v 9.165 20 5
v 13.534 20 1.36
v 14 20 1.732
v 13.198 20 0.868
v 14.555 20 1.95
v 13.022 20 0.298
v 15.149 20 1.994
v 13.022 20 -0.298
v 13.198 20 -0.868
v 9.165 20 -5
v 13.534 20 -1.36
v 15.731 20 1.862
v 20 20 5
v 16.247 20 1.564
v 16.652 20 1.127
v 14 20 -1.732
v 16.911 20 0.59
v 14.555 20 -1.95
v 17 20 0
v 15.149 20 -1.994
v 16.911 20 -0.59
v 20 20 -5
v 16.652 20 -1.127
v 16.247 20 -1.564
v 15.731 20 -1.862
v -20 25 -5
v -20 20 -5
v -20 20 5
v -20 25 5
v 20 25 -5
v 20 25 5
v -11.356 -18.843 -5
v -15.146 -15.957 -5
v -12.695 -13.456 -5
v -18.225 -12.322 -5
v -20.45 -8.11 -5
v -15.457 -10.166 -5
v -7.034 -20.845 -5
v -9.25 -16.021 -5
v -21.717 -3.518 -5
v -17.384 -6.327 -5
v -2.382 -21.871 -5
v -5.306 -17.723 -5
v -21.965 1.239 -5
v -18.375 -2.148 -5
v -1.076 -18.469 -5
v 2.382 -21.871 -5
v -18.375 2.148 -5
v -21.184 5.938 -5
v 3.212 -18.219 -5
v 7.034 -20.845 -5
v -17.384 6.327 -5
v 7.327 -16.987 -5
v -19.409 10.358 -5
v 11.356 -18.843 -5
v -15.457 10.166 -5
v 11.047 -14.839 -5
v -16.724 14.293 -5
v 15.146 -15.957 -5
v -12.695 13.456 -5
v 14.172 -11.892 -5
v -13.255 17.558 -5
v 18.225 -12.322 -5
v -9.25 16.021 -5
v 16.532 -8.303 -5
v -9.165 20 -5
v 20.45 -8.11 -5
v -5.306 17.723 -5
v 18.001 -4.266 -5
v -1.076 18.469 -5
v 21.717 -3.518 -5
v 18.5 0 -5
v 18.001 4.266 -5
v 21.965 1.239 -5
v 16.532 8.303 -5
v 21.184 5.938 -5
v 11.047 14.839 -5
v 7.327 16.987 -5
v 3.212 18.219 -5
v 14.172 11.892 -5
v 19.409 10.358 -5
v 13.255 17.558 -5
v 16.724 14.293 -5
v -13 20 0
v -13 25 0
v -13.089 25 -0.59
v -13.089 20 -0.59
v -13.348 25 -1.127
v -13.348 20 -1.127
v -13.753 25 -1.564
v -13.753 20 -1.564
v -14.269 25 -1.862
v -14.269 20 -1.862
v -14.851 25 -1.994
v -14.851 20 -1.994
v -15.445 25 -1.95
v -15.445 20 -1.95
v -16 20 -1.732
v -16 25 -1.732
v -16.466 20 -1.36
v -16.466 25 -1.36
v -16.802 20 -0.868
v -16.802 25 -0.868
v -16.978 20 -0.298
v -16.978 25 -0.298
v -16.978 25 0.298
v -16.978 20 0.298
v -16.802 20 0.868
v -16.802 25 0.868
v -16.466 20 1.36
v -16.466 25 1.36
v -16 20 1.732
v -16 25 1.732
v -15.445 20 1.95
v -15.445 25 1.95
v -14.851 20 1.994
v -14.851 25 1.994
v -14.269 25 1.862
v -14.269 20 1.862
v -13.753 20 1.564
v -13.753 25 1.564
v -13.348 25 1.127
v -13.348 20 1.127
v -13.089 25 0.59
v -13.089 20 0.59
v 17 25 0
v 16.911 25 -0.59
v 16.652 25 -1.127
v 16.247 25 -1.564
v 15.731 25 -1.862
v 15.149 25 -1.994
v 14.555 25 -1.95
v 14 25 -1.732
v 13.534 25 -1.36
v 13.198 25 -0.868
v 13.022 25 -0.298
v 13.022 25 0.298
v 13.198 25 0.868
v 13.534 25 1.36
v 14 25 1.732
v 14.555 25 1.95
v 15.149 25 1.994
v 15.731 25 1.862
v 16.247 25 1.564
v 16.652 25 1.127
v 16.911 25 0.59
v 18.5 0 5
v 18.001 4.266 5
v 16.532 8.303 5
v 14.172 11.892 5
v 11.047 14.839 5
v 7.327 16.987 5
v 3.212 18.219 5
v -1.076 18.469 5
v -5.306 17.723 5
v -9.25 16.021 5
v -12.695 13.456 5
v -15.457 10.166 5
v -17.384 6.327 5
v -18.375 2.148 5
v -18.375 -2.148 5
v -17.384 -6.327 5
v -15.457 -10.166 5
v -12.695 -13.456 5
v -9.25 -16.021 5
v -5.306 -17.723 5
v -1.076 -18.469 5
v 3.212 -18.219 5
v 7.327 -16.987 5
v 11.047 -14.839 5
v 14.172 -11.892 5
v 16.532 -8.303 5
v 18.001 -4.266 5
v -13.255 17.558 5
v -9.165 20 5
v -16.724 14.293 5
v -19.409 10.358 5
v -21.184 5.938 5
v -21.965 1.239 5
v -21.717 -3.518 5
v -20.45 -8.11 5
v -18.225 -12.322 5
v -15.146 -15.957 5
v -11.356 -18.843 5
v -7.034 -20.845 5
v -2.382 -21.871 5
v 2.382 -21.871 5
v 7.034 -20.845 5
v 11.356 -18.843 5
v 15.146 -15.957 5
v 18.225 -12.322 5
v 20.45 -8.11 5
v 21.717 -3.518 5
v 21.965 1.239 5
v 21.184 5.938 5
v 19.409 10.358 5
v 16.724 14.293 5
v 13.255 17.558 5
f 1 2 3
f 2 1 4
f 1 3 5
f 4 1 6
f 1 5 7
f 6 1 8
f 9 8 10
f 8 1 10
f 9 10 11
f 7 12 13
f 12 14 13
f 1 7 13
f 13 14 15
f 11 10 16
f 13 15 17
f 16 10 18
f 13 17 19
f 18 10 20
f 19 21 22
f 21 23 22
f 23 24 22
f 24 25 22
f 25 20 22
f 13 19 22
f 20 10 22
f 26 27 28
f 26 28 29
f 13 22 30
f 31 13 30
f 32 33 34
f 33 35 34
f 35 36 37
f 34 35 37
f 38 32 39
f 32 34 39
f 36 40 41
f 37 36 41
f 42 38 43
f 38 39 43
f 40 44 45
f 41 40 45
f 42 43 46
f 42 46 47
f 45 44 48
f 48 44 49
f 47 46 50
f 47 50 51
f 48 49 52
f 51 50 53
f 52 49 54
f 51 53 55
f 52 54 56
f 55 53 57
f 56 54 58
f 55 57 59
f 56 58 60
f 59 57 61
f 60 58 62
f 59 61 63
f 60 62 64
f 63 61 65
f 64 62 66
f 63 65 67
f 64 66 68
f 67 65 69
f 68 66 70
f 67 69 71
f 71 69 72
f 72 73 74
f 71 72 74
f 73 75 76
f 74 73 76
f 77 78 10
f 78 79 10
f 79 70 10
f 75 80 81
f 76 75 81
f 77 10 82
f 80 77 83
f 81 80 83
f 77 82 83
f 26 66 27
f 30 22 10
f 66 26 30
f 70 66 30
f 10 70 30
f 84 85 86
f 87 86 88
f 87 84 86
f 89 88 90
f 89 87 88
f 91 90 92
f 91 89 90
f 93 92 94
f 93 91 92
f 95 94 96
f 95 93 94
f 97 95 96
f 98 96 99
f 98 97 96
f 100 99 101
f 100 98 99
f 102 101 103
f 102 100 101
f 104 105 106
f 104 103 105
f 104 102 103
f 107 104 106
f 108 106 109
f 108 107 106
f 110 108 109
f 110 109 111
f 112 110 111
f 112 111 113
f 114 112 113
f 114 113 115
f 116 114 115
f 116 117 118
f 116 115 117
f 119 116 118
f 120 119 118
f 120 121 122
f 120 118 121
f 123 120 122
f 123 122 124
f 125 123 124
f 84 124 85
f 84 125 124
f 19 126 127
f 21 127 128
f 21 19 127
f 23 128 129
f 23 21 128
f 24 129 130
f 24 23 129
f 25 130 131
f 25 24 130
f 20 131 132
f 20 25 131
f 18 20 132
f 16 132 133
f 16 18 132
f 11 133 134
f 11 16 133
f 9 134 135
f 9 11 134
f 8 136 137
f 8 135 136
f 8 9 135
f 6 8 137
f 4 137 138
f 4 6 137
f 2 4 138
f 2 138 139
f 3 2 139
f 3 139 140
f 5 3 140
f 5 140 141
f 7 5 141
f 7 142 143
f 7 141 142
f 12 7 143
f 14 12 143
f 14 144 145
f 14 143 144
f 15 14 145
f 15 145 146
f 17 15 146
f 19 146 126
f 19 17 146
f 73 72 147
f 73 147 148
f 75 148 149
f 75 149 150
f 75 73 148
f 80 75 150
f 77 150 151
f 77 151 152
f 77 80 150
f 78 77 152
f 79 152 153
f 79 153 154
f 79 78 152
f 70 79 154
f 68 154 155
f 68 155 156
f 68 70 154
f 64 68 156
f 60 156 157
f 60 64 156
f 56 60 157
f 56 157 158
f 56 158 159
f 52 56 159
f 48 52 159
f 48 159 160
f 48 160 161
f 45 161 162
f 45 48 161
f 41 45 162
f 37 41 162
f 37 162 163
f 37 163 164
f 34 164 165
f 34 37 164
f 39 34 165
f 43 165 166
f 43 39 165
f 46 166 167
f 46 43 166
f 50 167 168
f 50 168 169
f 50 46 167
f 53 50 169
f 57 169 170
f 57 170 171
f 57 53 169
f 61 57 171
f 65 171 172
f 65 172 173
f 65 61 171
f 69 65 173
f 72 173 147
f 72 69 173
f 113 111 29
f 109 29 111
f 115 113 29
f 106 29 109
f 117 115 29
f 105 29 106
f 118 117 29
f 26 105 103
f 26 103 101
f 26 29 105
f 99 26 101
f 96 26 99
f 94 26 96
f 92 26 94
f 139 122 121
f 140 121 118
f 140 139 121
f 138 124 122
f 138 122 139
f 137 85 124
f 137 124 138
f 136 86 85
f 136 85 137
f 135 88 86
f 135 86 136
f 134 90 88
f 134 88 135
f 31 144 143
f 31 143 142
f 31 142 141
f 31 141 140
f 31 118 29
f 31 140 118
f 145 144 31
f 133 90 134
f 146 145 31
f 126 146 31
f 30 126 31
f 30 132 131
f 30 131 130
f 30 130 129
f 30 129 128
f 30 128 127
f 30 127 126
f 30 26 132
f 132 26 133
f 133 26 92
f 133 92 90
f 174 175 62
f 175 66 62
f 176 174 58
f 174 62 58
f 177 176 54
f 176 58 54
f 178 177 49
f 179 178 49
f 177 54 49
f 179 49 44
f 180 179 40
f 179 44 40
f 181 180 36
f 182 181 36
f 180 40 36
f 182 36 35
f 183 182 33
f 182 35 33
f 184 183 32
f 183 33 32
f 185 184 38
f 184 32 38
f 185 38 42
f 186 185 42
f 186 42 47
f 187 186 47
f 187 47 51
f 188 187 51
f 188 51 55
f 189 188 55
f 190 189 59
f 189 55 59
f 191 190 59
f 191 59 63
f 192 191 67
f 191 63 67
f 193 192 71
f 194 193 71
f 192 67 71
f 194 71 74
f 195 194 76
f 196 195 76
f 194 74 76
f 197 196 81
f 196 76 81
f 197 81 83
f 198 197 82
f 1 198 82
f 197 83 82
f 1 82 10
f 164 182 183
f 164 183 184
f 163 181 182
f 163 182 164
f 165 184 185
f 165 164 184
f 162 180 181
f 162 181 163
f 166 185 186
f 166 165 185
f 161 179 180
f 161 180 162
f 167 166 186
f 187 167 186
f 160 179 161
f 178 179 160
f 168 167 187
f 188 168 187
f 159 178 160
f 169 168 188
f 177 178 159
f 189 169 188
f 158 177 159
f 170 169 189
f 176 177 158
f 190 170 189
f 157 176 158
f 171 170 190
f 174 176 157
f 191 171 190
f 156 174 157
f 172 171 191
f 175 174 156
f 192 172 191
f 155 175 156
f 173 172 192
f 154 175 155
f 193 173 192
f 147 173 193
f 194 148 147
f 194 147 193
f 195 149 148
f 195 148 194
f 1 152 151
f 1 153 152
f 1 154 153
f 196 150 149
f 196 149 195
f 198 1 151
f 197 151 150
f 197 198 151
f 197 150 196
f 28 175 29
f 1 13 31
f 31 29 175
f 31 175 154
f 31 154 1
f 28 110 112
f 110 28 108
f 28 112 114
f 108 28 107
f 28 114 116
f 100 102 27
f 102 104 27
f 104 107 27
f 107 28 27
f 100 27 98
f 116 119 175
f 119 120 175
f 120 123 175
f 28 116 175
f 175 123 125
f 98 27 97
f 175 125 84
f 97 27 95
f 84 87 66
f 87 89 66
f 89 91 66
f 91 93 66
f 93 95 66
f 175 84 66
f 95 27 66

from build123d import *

# Parameters (mm, degrees)
CYLINDER002_R          = 2
CYLINDER002_DEPTH      = 10
CYLINDER002_ROLL_ANGLE = -90
CYLINDER001_R          = 18.5
CYLINDER001_DEPTH      = 10
CYLINDER003_R          = 2
CYLINDER003_DEPTH      = 10
CYLINDER003_ROLL_ANGLE = -90
BOX_W                  = 40
BOX_H                  = 5
BOX_DEPTH              = 10
CYLINDER_R             = 22
CYLINDER_DEPTH         = 10


with BuildPart() as cylinder002:
    # Cylinder002 → Cylinder002 (new body)
    with BuildSketch(Plane.XY):
        Circle(CYLINDER002_R)
    extrude(amount=CYLINDER002_DEPTH)


with BuildPart() as cylinder002_1:
    # Cylinder002 roll: moved
    add(cylinder002.part.rotate(Axis((0, 0, 0), (1, 0, 0)), CYLINDER002_ROLL_ANGLE))


with BuildPart() as cylinder002_2:
    # Cylinder002 placement: moved
    add(cylinder002_1.part.moved(Location((15, 20, 0))))


with BuildPart() as cylinder001:
    # Cylinder001 → Cylinder001 (new body)
    with BuildSketch(Plane.XY.offset(-5)):
        Circle(CYLINDER001_R)
    extrude(amount=CYLINDER001_DEPTH)


with BuildPart() as negative_fusion:
    # Cylinder003 → Cylinder003 (new body)
    with BuildSketch(Plane.XY):
        Circle(CYLINDER003_R)
    extrude(amount=CYLINDER003_DEPTH)


with BuildPart() as negative_fusion_1:
    # Cylinder003 roll: moved
    add(negative_fusion.part.rotate(Axis((0, 0, 0), (1, 0, 0)), CYLINDER003_ROLL_ANGLE))


with BuildPart() as negative_fusion_2:
    # Cylinder003 placement: moved
    add(negative_fusion_1.part.moved(Location((-15, 20, 0))))

    # Fusion001: union Cylinder002, Cylinder001
    add(cylinder002_2.part)
    add(cylinder001.part)


with BuildPart() as cube:
    # Box → Box (new body)
    with BuildSketch(Plane(origin=(-20, 20, -5), x_dir=(1, 0, 0), z_dir=(0, 0, 1))):
        with Locations((20, 2.5)):
            Rectangle(BOX_W, BOX_H)
    extrude(amount=BOX_DEPTH)


with BuildPart() as cut:
    # Cylinder → Cylinder (new body)
    with BuildSketch(Plane.XY.offset(-5)):
        Circle(CYLINDER_R)
    extrude(amount=CYLINDER_DEPTH)

    # Fusion: union Cube
    add(cube.part)

    # Cut: cut Negative Fusion
    add(negative_fusion_2.part, mode=Mode.SUBTRACT)


solid = cut.part
